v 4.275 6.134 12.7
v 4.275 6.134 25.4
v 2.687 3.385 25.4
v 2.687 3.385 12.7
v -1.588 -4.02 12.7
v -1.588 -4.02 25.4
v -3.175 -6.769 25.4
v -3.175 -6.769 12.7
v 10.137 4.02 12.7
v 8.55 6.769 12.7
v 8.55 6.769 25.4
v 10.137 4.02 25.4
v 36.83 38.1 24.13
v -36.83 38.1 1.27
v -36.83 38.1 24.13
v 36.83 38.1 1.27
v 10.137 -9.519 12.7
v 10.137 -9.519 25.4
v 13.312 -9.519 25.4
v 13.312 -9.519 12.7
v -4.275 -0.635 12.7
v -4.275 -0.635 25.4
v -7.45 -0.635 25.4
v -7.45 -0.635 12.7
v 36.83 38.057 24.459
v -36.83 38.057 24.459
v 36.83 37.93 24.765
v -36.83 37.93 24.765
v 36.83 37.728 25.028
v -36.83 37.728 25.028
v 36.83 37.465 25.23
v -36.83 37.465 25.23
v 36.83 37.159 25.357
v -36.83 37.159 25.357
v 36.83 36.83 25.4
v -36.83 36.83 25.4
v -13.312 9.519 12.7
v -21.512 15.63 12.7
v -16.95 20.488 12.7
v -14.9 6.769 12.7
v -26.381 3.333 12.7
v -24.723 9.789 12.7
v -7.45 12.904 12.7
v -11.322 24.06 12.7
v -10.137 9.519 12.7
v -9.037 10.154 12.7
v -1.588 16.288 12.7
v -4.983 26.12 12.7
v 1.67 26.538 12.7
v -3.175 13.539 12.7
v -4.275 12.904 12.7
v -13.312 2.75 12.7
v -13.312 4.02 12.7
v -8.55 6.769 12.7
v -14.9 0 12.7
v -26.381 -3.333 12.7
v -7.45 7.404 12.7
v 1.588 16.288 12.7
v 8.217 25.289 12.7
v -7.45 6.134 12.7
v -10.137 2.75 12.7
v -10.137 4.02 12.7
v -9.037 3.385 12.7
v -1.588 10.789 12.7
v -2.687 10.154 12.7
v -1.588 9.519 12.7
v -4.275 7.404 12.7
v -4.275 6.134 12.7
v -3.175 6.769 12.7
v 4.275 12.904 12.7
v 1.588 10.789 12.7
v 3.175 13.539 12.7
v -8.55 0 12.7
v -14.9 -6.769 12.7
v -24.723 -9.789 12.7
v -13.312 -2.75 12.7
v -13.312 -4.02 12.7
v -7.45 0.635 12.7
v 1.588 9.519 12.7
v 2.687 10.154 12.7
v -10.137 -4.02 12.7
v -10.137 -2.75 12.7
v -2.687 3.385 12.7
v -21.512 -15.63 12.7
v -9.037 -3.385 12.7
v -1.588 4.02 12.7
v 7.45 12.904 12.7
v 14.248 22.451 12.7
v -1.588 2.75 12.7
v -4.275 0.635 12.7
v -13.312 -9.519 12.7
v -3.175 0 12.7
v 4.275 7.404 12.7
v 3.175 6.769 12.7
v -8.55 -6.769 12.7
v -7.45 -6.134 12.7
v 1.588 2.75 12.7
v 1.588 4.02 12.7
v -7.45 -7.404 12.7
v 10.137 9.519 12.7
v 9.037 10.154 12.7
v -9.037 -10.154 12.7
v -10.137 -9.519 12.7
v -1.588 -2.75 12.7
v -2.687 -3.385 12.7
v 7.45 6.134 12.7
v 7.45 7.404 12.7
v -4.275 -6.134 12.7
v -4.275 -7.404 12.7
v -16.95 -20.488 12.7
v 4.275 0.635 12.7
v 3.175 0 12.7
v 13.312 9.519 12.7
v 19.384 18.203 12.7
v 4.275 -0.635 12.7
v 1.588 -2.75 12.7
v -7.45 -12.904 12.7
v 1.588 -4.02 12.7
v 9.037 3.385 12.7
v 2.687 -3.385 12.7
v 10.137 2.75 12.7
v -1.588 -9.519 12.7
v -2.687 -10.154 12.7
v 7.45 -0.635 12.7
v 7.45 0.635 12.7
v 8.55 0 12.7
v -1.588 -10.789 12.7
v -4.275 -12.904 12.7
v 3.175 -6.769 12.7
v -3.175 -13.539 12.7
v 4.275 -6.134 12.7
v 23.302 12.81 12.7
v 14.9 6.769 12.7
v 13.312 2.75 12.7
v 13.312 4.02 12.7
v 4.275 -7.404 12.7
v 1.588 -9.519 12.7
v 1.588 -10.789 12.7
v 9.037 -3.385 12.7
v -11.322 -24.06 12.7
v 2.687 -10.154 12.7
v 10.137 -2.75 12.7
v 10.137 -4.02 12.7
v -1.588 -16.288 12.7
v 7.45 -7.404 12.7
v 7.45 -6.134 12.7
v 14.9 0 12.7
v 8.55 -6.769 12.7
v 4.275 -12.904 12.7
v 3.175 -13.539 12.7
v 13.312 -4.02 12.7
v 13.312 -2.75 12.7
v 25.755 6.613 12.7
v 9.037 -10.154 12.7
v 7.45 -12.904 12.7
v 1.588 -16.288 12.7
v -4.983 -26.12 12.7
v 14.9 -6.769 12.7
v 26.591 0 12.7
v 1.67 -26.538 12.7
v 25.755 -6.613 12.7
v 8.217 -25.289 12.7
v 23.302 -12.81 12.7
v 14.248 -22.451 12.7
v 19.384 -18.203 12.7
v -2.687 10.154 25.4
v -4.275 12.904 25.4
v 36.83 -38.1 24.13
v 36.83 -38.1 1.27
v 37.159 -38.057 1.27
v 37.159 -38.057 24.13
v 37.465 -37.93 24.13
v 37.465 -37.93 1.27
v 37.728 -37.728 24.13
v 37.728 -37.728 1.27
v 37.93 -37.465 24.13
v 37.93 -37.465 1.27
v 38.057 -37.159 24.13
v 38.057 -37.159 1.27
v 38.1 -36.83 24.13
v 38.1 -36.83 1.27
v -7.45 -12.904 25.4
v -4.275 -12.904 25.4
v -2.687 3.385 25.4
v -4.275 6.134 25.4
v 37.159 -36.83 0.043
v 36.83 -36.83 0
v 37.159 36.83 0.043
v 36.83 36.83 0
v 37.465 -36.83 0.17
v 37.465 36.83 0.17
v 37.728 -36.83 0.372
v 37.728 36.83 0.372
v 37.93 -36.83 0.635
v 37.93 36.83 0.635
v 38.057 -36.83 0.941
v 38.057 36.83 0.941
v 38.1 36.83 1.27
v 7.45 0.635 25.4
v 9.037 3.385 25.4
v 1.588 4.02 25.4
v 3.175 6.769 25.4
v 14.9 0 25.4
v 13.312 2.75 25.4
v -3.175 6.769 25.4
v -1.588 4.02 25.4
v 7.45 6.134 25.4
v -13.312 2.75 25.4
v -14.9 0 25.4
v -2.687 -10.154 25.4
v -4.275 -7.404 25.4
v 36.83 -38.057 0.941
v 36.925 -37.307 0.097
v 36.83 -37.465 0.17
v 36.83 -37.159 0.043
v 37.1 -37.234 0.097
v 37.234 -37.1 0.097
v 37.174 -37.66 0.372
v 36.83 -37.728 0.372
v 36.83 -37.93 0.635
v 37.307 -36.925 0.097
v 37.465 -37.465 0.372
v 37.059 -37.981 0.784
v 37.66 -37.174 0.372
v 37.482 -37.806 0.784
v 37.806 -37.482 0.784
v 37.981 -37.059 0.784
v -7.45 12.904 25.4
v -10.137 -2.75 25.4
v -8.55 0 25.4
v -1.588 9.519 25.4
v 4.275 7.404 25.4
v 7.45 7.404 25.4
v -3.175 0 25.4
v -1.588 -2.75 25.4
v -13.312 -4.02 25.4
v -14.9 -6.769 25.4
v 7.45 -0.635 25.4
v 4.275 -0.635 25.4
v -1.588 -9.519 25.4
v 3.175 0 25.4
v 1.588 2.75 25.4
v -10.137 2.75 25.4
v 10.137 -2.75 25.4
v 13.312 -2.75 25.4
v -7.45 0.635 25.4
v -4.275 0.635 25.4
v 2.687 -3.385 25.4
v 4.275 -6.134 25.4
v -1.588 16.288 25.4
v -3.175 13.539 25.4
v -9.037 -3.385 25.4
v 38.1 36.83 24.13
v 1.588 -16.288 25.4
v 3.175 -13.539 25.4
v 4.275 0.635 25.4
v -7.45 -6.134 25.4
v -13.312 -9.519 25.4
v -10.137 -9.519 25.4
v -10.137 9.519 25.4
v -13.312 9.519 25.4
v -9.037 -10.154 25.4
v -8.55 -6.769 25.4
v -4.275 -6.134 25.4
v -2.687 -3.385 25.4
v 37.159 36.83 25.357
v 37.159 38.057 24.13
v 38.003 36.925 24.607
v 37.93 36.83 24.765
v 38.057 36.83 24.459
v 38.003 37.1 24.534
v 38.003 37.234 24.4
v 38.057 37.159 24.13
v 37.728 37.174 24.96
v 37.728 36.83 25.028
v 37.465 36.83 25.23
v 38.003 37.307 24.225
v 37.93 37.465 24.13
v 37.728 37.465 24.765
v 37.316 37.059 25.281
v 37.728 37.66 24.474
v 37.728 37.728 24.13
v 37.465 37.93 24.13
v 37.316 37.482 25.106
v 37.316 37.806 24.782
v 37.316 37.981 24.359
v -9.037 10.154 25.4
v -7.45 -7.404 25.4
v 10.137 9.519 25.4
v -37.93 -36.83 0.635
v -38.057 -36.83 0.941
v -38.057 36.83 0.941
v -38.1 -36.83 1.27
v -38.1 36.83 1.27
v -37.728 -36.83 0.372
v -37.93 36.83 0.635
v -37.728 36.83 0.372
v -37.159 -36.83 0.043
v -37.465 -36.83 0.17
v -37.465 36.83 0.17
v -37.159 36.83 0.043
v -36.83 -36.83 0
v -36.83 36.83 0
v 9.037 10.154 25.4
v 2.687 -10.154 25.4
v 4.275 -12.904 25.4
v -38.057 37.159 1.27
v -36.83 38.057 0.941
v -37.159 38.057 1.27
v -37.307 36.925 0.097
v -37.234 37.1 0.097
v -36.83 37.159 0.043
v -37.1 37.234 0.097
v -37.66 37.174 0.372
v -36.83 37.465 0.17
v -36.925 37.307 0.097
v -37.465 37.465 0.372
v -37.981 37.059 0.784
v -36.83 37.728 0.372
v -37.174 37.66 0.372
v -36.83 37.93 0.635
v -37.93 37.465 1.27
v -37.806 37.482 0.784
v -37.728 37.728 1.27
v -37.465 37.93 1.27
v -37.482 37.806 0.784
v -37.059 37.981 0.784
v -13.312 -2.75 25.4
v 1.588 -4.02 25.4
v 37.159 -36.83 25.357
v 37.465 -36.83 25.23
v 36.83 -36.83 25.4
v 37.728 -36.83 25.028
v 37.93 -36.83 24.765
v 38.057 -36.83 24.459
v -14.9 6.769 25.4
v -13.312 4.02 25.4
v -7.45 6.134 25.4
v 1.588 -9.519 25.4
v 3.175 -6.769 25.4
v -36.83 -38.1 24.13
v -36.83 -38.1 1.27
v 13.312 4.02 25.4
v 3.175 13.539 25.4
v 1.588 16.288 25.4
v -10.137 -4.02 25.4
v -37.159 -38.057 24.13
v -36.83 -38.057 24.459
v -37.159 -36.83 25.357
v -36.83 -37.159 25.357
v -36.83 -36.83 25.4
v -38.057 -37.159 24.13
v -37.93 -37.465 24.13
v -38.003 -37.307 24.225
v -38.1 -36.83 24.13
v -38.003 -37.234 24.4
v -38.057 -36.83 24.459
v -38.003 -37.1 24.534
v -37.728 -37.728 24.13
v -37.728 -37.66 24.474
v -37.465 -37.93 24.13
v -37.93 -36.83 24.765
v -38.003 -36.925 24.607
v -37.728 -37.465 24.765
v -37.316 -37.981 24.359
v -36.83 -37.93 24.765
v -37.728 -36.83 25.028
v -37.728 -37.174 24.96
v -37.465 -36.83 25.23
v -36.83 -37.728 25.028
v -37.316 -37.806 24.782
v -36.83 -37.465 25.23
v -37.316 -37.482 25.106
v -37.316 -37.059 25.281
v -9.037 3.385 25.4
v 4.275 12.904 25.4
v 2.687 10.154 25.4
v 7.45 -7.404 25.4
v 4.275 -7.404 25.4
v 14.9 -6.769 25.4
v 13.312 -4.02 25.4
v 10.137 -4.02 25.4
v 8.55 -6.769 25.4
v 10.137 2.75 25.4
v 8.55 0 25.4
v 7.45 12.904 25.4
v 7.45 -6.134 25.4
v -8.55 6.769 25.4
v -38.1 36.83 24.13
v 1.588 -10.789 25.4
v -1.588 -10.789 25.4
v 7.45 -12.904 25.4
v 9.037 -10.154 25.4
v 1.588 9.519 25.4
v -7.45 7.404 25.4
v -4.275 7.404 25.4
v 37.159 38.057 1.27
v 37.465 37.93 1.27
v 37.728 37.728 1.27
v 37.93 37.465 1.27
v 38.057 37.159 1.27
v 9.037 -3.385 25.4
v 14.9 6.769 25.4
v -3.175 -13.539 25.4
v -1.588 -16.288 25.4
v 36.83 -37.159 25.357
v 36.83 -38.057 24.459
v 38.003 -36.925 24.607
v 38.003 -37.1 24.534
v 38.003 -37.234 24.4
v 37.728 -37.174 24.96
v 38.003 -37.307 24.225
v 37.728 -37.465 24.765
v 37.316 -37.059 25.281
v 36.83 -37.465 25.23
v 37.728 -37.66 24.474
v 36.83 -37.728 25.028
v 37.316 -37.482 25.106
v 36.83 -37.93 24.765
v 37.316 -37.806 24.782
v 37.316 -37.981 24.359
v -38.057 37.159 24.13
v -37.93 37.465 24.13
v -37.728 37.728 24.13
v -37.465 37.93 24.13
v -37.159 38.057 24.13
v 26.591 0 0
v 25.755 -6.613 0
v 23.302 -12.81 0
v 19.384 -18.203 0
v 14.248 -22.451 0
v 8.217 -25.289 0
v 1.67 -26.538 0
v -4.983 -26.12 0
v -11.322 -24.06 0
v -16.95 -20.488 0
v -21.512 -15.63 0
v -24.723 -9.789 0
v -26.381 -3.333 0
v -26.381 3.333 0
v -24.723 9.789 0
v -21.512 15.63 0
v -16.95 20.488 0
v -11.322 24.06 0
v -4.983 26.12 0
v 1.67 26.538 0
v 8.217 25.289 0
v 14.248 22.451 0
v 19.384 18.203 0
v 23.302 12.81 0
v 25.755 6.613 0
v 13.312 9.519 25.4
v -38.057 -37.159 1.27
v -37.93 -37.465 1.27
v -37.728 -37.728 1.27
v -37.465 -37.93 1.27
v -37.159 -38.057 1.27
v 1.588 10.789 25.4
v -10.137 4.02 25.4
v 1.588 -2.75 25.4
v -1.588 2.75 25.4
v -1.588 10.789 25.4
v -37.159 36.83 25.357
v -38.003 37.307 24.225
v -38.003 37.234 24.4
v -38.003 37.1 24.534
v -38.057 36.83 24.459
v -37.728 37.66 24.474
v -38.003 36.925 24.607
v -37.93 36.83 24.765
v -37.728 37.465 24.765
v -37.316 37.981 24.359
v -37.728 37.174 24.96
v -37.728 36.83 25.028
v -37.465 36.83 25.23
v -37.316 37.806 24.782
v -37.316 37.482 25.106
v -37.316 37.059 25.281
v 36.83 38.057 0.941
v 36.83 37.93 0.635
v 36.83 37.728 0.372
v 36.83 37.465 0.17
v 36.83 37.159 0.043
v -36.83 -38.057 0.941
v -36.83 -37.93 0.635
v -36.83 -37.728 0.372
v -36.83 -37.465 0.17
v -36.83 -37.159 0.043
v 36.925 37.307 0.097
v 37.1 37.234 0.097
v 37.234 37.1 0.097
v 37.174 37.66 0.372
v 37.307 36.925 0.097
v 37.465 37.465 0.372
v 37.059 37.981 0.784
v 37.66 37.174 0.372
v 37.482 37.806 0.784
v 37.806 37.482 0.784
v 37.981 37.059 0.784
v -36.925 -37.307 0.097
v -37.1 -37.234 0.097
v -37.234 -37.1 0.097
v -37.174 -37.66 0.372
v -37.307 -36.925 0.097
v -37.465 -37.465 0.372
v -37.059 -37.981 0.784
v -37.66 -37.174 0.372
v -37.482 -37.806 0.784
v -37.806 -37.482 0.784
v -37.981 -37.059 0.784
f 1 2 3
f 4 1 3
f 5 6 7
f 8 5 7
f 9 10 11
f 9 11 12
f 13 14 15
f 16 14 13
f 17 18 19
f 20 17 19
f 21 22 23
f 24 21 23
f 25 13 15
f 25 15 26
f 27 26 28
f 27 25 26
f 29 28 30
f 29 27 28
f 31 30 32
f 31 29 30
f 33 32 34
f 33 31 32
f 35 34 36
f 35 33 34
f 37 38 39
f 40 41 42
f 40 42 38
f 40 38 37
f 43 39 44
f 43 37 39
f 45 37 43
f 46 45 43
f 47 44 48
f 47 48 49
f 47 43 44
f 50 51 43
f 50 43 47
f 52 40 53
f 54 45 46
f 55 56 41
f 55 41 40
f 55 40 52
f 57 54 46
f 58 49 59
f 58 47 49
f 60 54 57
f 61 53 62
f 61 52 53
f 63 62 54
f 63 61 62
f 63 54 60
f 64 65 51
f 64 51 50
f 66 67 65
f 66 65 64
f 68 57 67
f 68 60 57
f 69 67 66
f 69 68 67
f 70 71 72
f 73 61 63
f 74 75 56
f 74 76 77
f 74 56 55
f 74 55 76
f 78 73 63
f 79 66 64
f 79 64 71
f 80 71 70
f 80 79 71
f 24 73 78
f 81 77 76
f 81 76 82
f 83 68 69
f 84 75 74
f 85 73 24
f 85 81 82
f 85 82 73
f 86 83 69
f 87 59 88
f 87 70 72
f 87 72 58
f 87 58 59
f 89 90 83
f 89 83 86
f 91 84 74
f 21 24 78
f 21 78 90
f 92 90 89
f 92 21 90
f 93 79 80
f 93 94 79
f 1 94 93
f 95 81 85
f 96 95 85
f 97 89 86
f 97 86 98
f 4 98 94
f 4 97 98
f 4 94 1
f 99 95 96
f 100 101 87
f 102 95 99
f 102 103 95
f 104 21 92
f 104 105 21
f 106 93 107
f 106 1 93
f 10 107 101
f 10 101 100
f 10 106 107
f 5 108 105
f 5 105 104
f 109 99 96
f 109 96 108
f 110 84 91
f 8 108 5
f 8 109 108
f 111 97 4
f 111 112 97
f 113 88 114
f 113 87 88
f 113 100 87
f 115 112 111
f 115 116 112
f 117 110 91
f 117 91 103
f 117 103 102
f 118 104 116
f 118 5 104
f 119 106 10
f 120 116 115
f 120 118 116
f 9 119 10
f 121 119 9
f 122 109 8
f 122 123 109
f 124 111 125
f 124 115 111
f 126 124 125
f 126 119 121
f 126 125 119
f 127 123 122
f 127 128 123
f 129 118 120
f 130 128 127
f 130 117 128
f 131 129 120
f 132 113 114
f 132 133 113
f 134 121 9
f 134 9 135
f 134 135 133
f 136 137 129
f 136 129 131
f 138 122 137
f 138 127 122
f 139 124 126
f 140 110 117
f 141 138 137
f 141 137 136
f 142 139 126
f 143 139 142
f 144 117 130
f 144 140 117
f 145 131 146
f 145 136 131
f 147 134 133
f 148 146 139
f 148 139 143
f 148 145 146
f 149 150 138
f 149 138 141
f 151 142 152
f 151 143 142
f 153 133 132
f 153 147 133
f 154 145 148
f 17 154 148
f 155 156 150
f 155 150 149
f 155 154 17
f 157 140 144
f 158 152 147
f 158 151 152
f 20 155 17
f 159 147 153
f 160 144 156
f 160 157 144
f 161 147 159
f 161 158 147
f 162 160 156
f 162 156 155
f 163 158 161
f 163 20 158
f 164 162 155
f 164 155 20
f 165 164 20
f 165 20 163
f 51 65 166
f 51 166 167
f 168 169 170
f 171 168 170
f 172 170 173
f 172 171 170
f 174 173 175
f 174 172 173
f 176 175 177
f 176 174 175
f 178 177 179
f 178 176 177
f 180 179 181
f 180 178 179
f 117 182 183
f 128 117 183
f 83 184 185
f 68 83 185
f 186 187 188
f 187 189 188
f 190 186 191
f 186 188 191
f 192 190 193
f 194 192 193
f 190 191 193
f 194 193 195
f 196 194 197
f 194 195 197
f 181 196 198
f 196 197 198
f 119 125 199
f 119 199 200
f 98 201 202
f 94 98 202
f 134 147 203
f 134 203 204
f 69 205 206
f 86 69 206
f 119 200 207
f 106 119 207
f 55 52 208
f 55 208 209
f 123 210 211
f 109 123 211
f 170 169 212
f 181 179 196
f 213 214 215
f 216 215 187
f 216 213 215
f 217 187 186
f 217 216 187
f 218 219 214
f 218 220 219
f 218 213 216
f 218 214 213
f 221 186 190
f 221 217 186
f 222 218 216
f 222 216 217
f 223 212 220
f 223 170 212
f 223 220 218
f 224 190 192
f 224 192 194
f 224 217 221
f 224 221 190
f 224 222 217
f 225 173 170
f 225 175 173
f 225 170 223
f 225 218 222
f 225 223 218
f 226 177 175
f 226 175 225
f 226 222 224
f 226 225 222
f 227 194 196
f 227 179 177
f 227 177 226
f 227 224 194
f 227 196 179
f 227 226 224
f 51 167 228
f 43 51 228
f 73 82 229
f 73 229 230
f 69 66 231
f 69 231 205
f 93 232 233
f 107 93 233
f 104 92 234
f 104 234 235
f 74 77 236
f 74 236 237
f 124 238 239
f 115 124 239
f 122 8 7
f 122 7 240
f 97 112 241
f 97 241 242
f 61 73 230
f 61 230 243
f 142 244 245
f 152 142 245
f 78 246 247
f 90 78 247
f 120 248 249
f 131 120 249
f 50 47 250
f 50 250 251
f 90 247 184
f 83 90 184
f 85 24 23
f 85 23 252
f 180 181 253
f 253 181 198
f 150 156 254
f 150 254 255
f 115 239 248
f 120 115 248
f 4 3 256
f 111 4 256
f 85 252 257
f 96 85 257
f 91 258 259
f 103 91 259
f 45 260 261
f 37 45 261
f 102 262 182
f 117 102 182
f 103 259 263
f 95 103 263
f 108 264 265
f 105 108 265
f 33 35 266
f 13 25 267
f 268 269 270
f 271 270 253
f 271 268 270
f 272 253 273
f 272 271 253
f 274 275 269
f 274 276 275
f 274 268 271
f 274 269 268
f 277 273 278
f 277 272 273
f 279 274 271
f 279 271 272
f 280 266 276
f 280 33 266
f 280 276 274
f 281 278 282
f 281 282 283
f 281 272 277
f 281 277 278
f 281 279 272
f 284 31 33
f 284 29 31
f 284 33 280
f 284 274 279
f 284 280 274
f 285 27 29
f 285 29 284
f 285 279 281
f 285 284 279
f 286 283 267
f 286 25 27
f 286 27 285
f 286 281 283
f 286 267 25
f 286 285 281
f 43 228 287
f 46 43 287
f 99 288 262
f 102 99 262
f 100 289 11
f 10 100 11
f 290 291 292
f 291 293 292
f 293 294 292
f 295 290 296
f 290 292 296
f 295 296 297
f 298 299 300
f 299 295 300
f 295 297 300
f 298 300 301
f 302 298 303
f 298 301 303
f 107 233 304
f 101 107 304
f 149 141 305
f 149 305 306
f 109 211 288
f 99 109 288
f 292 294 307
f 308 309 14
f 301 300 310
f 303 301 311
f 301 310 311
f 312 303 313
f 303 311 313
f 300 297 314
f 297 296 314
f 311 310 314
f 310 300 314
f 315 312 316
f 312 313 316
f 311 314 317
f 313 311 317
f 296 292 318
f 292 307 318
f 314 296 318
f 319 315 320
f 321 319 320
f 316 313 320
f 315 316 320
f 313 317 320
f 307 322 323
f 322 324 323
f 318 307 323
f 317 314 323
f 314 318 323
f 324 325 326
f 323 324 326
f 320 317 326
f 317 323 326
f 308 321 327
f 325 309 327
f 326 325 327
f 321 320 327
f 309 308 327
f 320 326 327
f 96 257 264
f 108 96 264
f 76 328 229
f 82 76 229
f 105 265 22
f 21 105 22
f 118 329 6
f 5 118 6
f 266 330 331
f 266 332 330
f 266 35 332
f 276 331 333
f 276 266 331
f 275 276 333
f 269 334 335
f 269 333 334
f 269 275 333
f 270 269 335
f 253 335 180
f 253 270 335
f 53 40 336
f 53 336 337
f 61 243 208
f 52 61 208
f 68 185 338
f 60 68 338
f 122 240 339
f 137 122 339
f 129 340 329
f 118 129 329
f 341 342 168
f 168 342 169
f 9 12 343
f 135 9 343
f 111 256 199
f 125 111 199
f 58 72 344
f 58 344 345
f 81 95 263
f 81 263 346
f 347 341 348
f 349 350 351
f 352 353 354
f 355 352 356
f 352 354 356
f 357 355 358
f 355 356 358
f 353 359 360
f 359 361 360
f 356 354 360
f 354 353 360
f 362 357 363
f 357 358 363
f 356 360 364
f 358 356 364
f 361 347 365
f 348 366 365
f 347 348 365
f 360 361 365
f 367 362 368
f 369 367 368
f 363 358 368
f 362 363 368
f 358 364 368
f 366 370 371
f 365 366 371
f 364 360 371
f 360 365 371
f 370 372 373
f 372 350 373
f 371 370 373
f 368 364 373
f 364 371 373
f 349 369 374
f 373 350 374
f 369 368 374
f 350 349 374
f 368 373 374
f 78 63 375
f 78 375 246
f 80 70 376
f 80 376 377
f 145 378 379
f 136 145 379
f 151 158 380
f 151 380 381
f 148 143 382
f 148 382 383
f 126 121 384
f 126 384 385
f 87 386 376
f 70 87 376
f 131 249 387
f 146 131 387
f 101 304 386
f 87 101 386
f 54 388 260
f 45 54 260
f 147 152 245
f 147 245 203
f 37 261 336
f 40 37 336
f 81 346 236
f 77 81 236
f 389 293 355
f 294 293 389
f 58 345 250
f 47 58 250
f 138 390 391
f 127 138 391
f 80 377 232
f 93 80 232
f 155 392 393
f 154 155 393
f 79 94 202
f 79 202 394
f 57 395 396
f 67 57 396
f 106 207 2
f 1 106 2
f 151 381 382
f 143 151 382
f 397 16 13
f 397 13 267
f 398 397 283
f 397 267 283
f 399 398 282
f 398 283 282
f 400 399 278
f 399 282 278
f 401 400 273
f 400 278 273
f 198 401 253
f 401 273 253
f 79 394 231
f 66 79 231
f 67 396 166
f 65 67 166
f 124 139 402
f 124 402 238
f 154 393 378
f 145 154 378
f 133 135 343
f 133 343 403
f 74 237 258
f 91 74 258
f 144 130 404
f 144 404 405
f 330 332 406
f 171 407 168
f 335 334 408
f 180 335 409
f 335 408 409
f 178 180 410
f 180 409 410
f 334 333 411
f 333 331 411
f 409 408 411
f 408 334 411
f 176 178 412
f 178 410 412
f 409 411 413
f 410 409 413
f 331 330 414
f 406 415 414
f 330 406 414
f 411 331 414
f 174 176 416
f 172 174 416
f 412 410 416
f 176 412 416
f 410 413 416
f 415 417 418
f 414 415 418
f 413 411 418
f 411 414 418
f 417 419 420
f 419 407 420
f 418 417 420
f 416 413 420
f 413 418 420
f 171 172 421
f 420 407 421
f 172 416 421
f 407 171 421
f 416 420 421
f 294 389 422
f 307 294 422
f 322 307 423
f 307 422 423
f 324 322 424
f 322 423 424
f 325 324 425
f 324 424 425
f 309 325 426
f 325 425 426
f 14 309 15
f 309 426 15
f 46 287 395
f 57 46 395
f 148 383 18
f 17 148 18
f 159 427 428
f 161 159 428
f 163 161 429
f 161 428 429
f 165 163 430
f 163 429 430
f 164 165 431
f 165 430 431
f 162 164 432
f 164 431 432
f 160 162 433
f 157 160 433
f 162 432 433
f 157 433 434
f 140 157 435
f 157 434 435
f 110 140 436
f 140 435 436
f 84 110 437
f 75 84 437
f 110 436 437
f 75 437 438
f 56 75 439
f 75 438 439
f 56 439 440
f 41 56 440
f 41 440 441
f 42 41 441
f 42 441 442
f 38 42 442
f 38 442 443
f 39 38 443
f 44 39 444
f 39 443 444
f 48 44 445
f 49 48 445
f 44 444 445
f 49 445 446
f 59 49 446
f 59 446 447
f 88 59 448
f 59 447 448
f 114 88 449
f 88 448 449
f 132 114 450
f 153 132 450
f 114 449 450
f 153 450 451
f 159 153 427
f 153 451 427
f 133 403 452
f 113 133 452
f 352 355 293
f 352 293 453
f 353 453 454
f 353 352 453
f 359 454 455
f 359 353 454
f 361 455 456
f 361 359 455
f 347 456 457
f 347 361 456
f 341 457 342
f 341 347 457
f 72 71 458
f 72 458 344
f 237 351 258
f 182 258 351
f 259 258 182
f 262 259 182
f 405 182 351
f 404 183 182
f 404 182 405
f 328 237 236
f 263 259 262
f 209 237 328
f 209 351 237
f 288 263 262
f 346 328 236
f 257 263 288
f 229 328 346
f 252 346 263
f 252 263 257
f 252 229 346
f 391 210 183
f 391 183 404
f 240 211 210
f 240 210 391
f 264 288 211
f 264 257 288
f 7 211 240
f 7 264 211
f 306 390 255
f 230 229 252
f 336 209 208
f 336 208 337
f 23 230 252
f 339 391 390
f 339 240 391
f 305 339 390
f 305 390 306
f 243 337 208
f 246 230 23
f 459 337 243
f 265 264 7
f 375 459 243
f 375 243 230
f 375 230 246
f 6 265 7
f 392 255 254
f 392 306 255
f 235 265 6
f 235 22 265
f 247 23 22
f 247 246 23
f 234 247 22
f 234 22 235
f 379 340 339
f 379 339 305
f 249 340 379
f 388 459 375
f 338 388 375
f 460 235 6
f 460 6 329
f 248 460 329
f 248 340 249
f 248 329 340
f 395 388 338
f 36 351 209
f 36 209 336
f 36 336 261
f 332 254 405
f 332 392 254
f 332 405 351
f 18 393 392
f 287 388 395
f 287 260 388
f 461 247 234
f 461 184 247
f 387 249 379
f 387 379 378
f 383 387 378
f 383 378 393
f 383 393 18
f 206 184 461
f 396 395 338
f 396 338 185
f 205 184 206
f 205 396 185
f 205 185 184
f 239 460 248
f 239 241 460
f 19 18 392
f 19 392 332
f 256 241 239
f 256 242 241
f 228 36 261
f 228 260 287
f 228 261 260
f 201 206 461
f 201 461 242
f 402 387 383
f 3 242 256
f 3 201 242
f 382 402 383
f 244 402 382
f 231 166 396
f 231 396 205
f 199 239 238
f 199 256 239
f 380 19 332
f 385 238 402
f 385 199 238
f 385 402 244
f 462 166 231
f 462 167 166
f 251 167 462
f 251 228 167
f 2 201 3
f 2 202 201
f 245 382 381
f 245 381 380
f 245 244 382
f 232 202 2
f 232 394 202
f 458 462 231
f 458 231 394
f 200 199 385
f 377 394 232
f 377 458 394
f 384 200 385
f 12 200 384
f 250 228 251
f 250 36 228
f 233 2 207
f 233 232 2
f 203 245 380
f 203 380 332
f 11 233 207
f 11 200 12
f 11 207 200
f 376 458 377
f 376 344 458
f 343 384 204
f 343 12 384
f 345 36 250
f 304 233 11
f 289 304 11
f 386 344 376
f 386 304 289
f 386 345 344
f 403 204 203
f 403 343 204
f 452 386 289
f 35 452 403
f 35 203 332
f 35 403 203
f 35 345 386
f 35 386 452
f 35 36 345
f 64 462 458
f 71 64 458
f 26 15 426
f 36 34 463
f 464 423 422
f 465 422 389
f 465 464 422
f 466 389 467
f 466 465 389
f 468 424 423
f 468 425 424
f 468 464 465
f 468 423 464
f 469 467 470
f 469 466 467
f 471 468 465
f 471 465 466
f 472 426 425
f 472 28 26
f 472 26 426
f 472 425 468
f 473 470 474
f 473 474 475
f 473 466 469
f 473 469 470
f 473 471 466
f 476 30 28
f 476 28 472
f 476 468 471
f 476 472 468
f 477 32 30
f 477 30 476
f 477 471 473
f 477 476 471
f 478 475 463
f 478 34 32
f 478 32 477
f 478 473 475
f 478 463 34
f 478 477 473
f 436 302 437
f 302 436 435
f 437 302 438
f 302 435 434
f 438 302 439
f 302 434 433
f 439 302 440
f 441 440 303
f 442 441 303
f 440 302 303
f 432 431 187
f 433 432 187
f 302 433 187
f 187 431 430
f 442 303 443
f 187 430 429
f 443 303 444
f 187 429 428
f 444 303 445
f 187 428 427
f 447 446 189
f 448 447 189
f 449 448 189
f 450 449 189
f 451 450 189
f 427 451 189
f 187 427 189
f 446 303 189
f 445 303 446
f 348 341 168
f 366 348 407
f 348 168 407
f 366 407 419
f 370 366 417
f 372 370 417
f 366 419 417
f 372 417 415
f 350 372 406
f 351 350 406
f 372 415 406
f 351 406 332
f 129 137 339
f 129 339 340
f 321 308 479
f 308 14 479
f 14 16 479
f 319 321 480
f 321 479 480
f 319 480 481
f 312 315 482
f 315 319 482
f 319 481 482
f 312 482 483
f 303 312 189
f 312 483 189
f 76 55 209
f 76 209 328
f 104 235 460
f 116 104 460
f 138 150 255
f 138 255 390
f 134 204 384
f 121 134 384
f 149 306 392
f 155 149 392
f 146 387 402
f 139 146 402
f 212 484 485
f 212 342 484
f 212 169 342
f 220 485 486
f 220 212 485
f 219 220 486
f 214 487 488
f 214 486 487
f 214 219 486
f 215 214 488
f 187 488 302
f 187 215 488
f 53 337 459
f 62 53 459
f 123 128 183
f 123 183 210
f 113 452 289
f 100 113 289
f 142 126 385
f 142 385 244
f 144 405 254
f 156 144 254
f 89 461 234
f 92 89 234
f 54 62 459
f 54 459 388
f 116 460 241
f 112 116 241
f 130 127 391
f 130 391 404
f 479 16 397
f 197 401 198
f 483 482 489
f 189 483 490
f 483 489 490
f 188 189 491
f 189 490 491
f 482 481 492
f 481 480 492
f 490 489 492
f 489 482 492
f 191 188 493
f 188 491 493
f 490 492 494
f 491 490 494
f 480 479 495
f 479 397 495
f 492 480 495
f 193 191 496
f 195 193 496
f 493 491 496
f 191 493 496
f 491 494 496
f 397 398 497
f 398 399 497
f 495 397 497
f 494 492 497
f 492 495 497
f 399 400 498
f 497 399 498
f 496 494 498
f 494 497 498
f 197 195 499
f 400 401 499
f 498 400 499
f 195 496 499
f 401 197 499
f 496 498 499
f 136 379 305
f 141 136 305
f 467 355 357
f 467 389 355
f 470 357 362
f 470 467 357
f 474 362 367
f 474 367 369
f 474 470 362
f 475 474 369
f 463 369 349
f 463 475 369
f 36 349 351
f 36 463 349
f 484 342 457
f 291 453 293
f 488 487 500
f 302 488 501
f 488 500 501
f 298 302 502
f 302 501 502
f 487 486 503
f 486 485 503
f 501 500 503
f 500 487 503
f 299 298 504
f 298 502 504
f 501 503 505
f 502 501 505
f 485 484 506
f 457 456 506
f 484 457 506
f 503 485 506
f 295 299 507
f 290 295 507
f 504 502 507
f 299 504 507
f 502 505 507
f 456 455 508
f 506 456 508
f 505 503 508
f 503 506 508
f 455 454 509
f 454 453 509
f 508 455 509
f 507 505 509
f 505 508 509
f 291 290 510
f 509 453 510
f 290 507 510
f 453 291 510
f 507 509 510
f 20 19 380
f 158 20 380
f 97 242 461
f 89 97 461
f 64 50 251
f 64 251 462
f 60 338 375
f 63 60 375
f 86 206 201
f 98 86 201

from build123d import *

# Parameters (mm, degrees)
F0_W     = 76.2
F0_H     = 76.2
F1_DEPTH = 25.4
F2_R     = 26.590625
F3_DEPTH = 12.7
F4_R     = 1.27
F6_DEPTH = 25.4


with BuildPart() as f1:
    # F0 (on Top) → F1 (new body)
    with BuildSketch(Plane.XY):
        Rectangle(F0_W, F0_H)
    extrude(amount=F1_DEPTH)

    # F2 (on face) → F3 (cut)
    with BuildSketch(Plane(origin=(0, 0, 0), x_dir=(1, 0, 0), z_dir=(0, 0, -1))):
        Circle(F2_R)
    extrude(amount=-F3_DEPTH, mode=Mode.SUBTRACT)

    # F4
    f4_edges = [f1.edges().sort_by_distance(p)[0] for p in [
        (0, -38.1, 25.4),
        (0, 38.1, 25.4),
        (38.1, 0, 25.4),
        (38.1, -38.1, 12.7),
        (38.1, 38.1, 12.7),
        (-38.1, 38.1, 12.7),
        (-38.1, -38.1, 12.7),
        (-38.1, 0, 25.4),
        (0, -38.1, 0),
        (-38.1, 0, 0),
        (0, 38.1, 0),
        (38.1, 0, 0),
    ]]
    fillet(f4_edges, radius=F4_R)

    # F5 (on face) → F6 (cut)
    with BuildSketch(Plane.XY.offset(25.4)):
        Polygon((1.5875, -2.749631), (3.175, 0), (1.5875, 2.749631), (-1.5875, 2.749631), (-3.175, 0), (-1.5875, -2.749631), align=None)
        Polygon((-3.175, 6.769261), (-1.5875, 4.019631), (1.5875, 4.019631), (3.175, 6.769261), (1.5875, 9.518892), (-1.5875, 9.518892), align=None)
        Polygon((-9.037352, 3.384631), (-7.449852, 0.635), (-4.274852, 0.635), (-2.687352, 3.384631), (-4.274852, 6.134261), (-7.449852, 6.134261), align=None)
        Polygon((-7.449852, -6.134261), (-4.274852, -6.134261), (-2.687352, -3.384631), (-4.274852, -0.635), (-7.449852, -0.635), (-9.037352, -3.384631), align=None)
        Polygon((1.5875, -9.518892), (3.175, -6.769261), (1.5875, -4.019631), (-1.5875, -4.019631), (-3.175, -6.769261), (-1.5875, -9.518892), align=None)
        Polygon((9.037352, -3.384631), (7.449852, -0.635), (4.274852, -0.635), (2.687352, -3.384631), (4.274852, -6.134261), (7.449852, -6.134261), align=None)
        Polygon((7.449852, 6.134261), (4.274852, 6.134261), (2.687352, 3.384631), (4.274852, 0.635), (7.449852, 0.635), (9.037352, 3.384631), align=None)
        Polygon((4.274852, 7.404261), (7.449852, 7.404261), (9.037352, 10.153892), (7.449852, 12.903523), (4.274852, 12.903523), (2.687352, 10.153892), align=None)
        Polygon((-7.449852, 12.903523), (-9.037352, 10.153892), (-7.449852, 7.404261), (-4.274852, 7.404261), (-2.687352, 10.153892), (-4.274852, 12.903523), align=None)
        Polygon((-14.899705, 0), (-13.312205, -2.749631), (-10.137205, -2.749631), (-8.549705, 0), (-10.137205, 2.749631), (-13.312205, 2.749631), align=None)
        Polygon((-7.449852, -12.903523), (-4.274852, -12.903523), (-2.687352, -10.153892), (-4.274852, -7.404261), (-7.449852, -7.404261), (-9.037352, -10.153892), align=None)
        Polygon((7.449852, -12.903523), (9.037352, -10.153892), (7.449852, -7.404261), (4.274852, -7.404261), (2.687352, -10.153892), (4.274852, -12.903523), align=None)
        Polygon((14.899705, 0), (13.312205, 2.749631), (10.137205, 2.749631), (8.549705, 0), (10.137205, -2.749631), (13.312205, -2.749631), align=None)
        Polygon((-1.5875, 10.788892), (1.5875, 10.788892), (3.175, 13.538523), (1.5875, 16.288153), (-1.5875, 16.288153), (-3.175, 13.538523), align=None)
        Polygon((-13.312205, 9.518892), (-14.899705, 6.769261), (-13.312205, 4.019631), (-10.137205, 4.019631), (-8.549705, 6.769261), (-10.137205, 9.518892), align=None)
        Polygon((-14.899705, -6.769261), (-13.312205, -9.518892), (-10.137205, -9.518892), (-8.549705, -6.769261), (-10.137205, -4.019631), (-13.312205, -4.019631), align=None)
        Polygon((-1.5875, -16.288153), (1.5875, -16.288153), (3.175, -13.538523), (1.5875, -10.788892), (-1.5875, -10.788892), (-3.175, -13.538523), align=None)
        Polygon((13.312205, -9.518892), (14.899705, -6.769261), (13.312205, -4.019631), (10.137205, -4.019631), (8.549705, -6.769261), (10.137205, -9.518892), align=None)
        Polygon((14.899705, 6.769261), (13.312205, 9.518892), (10.137205, 9.518892), (8.549705, 6.769261), (10.137205, 4.019631), (13.312205, 4.019631), align=None)
    extrude(amount=-F6_DEPTH, mode=Mode.SUBTRACT)


solid = f1.part
